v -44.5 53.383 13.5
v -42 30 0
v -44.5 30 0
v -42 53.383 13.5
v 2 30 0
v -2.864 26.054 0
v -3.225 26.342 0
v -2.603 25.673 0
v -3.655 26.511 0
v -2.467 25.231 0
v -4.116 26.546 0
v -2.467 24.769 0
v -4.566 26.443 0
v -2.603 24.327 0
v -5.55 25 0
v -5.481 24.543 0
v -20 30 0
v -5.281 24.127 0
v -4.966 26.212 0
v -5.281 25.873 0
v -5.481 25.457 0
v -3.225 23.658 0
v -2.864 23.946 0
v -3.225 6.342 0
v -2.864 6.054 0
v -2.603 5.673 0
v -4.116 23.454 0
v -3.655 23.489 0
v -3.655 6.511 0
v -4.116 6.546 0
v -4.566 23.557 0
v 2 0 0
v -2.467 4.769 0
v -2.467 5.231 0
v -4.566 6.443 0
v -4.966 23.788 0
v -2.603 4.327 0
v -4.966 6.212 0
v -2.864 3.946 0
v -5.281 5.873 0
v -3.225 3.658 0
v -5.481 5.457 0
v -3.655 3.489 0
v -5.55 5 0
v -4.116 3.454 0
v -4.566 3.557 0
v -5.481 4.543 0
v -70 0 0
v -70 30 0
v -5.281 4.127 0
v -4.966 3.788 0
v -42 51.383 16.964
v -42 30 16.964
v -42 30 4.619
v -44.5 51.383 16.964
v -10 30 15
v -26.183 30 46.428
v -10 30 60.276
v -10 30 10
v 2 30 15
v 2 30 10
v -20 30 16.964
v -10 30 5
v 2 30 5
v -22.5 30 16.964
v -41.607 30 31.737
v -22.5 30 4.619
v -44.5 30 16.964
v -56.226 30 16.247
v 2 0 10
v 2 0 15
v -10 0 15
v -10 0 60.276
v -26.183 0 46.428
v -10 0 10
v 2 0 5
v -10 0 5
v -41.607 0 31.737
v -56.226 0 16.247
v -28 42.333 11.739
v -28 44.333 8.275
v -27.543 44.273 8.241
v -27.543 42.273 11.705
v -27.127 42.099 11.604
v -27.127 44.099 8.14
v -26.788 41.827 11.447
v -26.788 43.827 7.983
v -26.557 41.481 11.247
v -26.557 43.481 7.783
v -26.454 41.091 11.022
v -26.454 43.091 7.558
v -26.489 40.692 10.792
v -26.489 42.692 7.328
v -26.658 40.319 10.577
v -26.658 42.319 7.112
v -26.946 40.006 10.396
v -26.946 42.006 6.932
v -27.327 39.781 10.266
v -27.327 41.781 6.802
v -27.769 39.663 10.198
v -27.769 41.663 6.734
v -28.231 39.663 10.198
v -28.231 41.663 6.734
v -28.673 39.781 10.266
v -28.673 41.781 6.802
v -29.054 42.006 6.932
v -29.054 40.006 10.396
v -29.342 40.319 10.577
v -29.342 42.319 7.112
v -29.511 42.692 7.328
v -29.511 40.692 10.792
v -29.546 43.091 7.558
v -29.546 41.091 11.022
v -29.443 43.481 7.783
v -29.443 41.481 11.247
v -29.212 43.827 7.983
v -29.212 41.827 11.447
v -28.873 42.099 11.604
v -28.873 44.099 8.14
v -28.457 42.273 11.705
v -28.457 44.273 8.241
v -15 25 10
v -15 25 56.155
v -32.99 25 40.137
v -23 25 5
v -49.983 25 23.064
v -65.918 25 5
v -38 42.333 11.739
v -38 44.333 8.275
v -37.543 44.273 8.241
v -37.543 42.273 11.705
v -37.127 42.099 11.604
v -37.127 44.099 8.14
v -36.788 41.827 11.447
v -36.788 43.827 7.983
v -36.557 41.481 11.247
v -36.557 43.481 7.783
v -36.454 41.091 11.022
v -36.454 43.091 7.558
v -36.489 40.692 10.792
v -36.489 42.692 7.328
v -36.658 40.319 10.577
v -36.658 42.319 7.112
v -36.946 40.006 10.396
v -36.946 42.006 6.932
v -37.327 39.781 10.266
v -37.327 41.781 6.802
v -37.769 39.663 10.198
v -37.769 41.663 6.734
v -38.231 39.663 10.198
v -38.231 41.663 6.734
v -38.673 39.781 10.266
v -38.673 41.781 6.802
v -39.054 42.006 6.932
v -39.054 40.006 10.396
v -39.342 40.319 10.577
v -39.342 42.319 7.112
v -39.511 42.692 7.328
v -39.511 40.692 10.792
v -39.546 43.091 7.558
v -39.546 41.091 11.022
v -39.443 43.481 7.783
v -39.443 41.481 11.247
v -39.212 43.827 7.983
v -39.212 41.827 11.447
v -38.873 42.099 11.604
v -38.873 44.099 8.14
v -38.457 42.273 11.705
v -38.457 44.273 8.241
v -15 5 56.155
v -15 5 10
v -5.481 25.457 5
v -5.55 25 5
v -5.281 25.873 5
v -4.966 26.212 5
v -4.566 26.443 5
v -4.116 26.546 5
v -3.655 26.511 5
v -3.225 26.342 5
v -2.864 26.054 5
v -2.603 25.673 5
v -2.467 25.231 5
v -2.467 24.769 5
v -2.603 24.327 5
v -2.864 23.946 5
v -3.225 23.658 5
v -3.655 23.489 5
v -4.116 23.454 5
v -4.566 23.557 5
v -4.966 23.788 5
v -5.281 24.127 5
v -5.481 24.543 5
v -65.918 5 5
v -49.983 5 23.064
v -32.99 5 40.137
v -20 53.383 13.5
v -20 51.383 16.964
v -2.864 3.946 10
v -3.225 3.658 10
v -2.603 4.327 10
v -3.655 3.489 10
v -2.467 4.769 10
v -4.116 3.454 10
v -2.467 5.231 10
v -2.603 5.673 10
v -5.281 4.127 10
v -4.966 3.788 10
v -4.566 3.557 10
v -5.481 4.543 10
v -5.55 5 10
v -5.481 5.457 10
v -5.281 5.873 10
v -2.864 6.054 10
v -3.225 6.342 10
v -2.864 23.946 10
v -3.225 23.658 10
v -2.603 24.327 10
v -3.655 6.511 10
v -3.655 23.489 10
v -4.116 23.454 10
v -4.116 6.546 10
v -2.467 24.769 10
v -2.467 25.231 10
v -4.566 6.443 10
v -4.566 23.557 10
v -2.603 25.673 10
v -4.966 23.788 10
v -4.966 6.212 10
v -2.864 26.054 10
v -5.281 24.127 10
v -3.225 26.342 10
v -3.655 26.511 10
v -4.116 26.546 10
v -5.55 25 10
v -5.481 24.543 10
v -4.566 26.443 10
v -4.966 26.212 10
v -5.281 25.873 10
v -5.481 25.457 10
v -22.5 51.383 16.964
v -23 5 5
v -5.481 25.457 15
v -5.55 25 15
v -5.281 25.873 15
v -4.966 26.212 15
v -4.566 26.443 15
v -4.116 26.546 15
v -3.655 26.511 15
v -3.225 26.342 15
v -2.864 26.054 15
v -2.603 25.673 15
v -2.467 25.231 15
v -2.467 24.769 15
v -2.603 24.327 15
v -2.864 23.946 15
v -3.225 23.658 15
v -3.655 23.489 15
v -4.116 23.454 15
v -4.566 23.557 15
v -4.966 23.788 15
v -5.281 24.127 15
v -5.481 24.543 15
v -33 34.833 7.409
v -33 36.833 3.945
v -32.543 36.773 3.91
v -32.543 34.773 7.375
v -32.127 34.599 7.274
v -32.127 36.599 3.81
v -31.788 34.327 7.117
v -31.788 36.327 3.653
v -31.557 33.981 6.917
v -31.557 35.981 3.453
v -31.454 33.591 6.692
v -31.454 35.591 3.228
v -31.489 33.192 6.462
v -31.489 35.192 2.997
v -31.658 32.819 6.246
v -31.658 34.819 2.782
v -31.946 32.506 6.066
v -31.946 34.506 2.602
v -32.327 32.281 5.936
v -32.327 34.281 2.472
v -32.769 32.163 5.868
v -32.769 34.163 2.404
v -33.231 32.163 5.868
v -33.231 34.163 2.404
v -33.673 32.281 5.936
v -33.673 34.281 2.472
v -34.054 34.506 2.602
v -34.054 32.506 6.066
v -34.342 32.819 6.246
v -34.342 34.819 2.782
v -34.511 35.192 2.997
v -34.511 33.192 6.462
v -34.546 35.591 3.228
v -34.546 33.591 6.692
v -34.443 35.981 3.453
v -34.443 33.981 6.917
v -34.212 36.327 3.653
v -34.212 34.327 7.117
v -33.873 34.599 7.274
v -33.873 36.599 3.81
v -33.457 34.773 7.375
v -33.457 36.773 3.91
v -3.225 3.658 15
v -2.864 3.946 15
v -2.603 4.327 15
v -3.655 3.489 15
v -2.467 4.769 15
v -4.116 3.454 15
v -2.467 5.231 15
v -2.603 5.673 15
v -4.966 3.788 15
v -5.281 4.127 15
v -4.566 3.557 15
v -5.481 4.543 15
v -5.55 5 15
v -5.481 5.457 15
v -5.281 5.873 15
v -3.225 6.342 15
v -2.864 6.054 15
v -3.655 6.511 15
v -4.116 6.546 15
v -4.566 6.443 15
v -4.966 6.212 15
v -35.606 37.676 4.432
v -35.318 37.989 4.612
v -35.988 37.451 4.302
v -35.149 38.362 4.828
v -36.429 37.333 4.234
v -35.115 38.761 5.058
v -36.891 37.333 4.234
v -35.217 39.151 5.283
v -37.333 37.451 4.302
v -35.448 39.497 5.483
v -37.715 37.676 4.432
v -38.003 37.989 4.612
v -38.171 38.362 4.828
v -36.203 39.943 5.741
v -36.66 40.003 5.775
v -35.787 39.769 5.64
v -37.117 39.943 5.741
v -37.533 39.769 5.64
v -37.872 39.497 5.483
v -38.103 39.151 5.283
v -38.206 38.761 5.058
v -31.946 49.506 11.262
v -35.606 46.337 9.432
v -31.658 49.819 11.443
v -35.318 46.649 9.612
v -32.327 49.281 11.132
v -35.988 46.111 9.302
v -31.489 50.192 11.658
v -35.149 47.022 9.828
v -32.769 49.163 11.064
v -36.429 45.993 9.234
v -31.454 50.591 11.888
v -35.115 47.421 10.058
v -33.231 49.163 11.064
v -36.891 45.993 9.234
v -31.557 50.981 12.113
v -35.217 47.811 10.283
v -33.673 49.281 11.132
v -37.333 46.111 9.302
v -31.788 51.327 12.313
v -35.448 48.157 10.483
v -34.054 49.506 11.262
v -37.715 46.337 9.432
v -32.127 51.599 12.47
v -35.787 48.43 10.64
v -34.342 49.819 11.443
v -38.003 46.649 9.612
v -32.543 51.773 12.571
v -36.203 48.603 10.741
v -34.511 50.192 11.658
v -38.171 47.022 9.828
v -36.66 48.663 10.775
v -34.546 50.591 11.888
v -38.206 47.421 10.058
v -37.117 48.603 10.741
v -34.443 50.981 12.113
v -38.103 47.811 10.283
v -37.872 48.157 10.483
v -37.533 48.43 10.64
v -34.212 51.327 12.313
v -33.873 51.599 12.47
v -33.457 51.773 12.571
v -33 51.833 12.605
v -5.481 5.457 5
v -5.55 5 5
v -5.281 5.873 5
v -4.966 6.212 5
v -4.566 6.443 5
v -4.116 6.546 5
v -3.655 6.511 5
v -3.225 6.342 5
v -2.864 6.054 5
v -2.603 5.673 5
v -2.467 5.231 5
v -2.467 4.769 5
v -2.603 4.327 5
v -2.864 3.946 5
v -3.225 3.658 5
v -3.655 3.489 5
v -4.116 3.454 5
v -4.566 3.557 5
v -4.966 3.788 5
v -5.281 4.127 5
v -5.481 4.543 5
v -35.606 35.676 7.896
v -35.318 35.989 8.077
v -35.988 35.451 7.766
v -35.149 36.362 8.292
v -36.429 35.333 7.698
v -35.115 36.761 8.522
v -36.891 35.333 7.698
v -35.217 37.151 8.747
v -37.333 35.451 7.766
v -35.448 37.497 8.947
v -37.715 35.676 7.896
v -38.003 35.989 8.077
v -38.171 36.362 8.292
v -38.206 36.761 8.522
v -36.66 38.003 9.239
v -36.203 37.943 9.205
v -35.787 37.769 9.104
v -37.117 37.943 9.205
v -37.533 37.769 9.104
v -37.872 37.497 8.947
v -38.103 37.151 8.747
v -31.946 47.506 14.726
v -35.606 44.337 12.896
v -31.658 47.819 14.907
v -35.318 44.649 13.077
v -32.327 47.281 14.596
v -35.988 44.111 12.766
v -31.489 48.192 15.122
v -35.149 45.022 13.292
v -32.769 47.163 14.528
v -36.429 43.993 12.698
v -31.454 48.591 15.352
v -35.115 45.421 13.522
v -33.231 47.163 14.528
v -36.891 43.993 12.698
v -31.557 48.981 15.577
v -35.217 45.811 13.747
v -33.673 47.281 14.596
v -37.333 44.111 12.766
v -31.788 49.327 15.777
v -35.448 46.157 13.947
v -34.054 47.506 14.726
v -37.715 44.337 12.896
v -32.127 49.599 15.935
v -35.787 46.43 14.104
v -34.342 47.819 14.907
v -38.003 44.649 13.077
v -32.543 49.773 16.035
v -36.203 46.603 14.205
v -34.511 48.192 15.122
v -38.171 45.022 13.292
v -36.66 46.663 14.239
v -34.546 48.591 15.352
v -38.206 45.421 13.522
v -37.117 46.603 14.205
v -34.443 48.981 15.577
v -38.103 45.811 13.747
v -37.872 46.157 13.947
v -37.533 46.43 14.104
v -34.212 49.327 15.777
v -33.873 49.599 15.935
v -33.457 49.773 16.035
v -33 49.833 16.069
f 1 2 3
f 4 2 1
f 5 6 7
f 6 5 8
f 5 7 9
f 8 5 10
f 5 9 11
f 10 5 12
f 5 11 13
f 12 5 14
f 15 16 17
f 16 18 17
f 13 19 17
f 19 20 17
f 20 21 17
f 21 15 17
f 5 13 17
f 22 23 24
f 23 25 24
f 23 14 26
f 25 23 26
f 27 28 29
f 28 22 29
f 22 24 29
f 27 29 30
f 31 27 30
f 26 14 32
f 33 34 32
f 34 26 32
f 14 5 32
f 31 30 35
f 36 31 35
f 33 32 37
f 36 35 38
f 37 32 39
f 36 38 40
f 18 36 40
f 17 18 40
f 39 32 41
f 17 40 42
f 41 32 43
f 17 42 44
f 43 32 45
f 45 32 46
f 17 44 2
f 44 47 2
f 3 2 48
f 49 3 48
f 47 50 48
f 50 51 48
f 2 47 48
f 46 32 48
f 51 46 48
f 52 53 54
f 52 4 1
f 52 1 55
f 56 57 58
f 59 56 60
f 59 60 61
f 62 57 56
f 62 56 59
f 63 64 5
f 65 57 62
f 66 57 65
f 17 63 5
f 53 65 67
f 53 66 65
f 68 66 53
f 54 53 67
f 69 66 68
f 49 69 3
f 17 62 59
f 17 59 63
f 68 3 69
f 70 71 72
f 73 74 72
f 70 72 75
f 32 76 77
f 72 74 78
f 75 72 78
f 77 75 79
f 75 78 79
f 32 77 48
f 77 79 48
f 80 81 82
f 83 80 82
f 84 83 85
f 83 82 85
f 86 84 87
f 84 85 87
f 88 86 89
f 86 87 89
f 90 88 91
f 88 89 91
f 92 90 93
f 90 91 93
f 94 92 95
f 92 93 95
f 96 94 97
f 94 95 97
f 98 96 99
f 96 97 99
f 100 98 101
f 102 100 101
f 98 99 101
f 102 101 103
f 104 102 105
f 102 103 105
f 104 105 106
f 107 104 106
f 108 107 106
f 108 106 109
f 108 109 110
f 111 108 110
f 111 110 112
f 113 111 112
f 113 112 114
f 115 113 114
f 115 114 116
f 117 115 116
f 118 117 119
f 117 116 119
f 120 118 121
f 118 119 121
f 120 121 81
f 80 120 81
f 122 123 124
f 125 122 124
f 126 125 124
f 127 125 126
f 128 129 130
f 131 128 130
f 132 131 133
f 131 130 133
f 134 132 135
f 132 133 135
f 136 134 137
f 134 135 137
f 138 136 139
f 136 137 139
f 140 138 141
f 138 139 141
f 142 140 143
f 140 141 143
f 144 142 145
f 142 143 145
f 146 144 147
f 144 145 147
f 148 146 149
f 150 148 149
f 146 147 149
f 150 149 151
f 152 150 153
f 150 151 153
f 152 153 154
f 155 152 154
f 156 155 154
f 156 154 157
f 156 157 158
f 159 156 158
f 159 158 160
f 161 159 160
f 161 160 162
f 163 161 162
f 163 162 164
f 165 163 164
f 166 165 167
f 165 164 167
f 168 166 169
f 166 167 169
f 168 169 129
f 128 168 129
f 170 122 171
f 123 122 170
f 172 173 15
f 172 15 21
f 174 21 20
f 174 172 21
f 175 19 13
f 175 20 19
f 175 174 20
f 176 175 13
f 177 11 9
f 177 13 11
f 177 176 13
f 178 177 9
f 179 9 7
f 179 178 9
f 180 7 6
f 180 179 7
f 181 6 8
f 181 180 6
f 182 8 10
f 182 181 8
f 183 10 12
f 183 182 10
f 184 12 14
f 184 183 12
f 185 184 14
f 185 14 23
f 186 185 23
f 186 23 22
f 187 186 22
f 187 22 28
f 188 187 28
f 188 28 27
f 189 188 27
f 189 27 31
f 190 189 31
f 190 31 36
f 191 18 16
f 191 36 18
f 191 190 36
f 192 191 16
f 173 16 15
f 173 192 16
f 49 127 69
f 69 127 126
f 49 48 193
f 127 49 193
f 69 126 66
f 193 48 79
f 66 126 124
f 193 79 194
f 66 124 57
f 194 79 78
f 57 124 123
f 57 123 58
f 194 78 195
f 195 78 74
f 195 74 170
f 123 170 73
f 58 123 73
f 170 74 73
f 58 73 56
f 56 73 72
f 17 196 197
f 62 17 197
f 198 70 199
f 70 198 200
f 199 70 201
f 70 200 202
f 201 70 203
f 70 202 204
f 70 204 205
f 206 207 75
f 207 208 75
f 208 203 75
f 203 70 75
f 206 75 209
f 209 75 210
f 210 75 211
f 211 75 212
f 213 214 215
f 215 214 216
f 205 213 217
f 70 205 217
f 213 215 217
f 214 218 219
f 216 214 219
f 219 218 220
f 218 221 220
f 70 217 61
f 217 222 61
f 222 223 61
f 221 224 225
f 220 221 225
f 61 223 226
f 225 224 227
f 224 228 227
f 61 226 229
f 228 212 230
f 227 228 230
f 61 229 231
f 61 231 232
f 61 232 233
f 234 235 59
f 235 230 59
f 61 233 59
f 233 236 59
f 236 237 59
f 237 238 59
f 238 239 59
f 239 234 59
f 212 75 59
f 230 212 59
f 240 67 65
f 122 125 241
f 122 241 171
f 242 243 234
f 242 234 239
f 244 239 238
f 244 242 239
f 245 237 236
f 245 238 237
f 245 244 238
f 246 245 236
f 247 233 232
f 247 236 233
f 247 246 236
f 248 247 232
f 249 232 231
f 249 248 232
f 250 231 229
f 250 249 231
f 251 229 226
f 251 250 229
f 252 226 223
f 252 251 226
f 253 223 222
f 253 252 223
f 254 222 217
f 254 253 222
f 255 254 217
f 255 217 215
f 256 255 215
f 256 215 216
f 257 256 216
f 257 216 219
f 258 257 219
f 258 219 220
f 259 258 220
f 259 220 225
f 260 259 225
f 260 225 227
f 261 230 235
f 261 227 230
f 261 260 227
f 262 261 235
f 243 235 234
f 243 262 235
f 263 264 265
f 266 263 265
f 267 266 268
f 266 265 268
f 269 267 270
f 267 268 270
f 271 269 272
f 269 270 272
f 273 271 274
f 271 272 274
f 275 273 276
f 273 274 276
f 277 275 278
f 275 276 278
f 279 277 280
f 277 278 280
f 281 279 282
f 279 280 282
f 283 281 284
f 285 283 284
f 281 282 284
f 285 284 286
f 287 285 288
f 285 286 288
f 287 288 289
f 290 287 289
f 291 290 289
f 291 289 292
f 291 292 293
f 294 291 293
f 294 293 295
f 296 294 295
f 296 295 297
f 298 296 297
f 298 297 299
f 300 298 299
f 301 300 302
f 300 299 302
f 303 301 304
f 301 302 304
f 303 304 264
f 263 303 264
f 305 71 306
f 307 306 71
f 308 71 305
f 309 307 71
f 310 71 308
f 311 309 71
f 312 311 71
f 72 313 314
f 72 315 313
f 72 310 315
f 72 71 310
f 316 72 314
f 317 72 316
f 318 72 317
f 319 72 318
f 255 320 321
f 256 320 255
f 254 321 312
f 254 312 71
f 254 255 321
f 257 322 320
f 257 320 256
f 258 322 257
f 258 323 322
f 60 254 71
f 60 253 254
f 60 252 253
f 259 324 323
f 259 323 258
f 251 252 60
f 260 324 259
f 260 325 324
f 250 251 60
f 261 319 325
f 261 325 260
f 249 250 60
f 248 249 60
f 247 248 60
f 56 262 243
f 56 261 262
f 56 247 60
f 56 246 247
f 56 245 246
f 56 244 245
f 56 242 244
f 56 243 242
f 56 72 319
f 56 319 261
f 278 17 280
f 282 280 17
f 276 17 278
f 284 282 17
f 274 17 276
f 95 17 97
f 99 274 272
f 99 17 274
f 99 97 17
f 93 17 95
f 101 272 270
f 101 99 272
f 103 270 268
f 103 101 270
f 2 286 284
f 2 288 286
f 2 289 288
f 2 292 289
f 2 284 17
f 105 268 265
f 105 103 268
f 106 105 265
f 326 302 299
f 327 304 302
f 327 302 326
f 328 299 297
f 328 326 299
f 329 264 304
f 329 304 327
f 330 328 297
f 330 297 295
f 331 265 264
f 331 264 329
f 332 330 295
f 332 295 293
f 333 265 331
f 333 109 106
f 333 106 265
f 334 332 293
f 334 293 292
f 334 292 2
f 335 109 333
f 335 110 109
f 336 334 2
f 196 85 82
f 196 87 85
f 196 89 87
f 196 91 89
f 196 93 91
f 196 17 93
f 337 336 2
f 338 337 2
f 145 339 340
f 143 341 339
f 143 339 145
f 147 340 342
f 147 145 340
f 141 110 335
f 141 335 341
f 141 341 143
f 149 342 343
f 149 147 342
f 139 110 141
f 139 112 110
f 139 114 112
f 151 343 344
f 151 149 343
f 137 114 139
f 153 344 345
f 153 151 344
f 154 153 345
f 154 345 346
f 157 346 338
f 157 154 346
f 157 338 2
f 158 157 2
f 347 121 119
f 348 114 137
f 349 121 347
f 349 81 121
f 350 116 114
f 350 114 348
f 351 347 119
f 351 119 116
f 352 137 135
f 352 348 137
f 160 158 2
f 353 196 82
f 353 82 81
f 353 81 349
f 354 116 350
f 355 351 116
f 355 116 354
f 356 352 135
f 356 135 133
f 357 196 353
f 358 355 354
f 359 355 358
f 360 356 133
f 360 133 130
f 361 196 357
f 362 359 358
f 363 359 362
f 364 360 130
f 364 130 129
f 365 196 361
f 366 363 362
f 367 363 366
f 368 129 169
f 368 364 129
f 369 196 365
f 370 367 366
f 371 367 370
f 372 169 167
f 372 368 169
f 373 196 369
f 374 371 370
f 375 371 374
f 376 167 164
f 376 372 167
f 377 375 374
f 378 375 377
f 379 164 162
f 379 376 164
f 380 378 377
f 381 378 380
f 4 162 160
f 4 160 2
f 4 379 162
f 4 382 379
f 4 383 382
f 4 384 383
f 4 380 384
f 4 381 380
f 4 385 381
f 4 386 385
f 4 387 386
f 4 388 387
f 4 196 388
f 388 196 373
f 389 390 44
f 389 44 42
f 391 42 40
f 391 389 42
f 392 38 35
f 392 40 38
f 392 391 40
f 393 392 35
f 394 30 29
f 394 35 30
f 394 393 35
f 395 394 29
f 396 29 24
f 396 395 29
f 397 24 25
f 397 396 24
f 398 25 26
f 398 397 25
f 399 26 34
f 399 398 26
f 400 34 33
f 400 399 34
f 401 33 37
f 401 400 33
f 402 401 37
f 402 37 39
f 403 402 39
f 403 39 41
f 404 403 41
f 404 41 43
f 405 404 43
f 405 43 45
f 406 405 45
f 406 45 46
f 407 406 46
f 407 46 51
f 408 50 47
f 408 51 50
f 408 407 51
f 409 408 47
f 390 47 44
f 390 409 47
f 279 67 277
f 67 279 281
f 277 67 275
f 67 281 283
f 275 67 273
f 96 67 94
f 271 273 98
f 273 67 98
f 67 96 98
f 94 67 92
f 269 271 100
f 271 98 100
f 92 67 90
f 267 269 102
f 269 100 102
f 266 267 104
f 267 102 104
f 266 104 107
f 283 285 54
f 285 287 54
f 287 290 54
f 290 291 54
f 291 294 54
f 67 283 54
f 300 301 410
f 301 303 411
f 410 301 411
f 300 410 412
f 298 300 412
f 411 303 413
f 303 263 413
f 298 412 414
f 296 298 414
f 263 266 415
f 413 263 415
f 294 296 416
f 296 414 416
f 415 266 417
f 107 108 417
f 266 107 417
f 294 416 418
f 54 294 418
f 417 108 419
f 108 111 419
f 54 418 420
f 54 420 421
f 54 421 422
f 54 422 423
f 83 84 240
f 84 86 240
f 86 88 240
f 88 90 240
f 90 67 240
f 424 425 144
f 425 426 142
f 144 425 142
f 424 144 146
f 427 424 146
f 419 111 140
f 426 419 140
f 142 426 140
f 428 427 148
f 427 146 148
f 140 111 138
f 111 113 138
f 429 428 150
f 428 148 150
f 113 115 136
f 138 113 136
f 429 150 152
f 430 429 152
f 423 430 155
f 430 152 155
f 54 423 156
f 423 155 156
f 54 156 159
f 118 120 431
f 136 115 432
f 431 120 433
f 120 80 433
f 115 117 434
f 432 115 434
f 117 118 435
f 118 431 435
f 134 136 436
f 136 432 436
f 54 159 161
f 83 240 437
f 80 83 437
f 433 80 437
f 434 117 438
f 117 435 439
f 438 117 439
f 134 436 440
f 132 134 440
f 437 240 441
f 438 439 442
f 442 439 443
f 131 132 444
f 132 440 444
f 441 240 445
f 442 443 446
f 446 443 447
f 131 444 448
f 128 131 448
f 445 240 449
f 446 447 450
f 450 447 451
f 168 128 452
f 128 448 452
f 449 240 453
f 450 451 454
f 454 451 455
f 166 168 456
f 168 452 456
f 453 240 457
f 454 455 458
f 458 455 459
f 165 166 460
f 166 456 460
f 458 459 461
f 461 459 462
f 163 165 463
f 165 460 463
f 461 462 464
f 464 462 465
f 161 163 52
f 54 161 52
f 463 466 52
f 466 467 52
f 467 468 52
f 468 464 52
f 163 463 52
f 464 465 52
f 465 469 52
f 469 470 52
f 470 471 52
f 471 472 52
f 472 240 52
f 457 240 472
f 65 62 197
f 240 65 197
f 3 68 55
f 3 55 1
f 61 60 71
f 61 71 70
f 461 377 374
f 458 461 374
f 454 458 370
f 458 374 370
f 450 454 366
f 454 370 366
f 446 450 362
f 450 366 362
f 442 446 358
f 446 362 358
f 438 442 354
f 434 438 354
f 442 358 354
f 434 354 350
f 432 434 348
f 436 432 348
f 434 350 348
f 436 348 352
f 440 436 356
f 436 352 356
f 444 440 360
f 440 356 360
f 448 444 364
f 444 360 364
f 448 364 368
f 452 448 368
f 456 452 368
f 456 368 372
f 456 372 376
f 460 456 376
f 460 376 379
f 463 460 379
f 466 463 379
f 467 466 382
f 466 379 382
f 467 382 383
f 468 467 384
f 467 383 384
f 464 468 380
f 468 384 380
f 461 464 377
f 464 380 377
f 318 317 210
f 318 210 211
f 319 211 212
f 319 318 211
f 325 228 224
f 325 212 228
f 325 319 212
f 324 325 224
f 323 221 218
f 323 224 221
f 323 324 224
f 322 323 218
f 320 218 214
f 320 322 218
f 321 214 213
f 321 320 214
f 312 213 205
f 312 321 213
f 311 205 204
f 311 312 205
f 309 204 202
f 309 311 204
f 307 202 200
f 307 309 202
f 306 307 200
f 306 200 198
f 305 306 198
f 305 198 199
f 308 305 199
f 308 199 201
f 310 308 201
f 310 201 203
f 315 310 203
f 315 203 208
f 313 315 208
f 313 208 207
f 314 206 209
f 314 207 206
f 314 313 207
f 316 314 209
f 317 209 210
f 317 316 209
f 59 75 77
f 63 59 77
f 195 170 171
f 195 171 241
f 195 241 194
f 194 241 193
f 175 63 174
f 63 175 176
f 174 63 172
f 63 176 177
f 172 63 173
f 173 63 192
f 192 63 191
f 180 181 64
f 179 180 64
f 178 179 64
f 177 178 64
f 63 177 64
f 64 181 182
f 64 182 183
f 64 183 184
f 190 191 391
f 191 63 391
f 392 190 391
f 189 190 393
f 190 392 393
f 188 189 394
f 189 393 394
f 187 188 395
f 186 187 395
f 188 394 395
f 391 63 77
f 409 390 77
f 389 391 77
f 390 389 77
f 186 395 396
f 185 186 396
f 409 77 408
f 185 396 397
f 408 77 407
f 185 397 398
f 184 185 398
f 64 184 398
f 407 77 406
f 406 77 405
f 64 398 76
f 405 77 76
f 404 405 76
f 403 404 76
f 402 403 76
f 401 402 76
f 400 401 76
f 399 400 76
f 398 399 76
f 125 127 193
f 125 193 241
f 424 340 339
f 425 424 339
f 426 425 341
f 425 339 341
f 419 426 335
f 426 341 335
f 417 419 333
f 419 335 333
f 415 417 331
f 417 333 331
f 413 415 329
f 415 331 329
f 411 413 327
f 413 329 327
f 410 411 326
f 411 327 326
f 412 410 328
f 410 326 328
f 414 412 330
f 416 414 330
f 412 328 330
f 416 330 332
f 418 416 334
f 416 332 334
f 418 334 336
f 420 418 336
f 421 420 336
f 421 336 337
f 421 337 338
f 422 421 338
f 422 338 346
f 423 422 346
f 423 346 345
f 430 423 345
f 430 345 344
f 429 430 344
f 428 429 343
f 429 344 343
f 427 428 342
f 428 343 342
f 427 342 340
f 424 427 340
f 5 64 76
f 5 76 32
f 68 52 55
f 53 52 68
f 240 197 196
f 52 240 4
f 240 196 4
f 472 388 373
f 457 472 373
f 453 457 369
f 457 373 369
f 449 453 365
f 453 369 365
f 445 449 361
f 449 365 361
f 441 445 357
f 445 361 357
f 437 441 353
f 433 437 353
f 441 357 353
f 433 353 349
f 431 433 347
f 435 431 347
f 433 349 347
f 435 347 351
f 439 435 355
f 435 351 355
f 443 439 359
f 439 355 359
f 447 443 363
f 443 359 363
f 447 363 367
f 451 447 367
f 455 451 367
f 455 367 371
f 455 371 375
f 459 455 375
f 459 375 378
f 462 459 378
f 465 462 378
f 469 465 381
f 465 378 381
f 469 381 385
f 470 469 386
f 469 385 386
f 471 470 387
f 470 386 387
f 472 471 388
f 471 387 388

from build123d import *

# Parameters (mm, degrees)
EXTRUDE_1_DEPTH          = 30
CUT_EXTRUDE_1_DEPTH      = 98.124713642
CUT_EXTRUDE_1_DEPTH_BACK = 98.124713642
SKETCH_2_R               = 1.55
CUT_EXTRUDE_6_DEPTH      = 10
EXTRUDE_3_DEPTH          = 12.5
SKETCH_12_W              = 5
SKETCH_12_H              = 30
EXTRUDE_4_DEPTH          = 2
SKETCH_14_W              = 22
SKETCH_14_H              = 27
SKETCH_14_R              = 1.55
EXTRUDE_5_DEPTH          = 4
EXTRUDE_8_DEPTH          = 2.5
EXTRUDE_9_DEPTH          = 2.5


with BuildPart() as part:
    # 草图1 → 凸台-拉伸1 (new body)
    with BuildSketch(Plane(origin=(0, 0, 0), x_dir=(1, 0, 0), z_dir=(0, 1, 0))):
        with BuildLine():
            Line((0, 0), (-70, 0))
            ThreePointArc((-70, 0), (-41.606545869, -31.737243891), (-10, -60.276114672))
            Line((-10, -60.276114672), (-10, -15))
            Line((-10, -15), (0, -15))
            Line((0, -15), (0, -10))
            Line((0, -10), (-10, -10))
            Line((-10, -10), (-10, -5))
            Line((-10, -5), (0, -5))
            Line((0, -5), (0, 0))
        make_face()
    extrude(amount=EXTRUDE_1_DEPTH)

    # 草图2 → 切除-拉伸1 (cut, two sides: drawn at the far end of the back side and taken through both)
    with BuildSketch(Plane(origin=(0, 0, 0), x_dir=(-1, 0, 0), z_dir=(0, 0, -1)).offset(-CUT_EXTRUDE_1_DEPTH_BACK)):
        with Locations((4, 25)):
            Circle(SKETCH_2_R)
        with Locations((4, 5)):
            Circle(SKETCH_2_R)
    extrude(amount=CUT_EXTRUDE_1_DEPTH + CUT_EXTRUDE_1_DEPTH_BACK, mode=Mode.SUBTRACT)

    # 草图9 → 切除-拉伸6 (cut, symmetric)
    with BuildSketch(Plane(origin=(0, 15, 0), x_dir=(1, 0, 0), z_dir=(0, 1, 0))):
        with BuildLine():
            Line((-65.918016471, -5), (-59.391772218, -5))
            Line((-59.391772218, -5), (-15, -5))
            Line((-15, -5), (-15, -15))
            Line((-15, -15), (-15, -49.60330608))
            Line((-15, -49.60330608), (-15, -56.155472209))
            ThreePointArc((-15, -56.155472209), (-41.615194331, -31.728555364), (-65.918016471, -5))
        make_face()
    extrude(amount=CUT_EXTRUDE_6_DEPTH, both=True, mode=Mode.SUBTRACT)

    # 草图11 → 凸台-拉伸3 (add, symmetric)
    with BuildSketch(Plane(origin=(0, 15, 0), x_dir=(1, 0, 0), z_dir=(0, 1, 0))):
        Polygon((-15, -5), (-23, -5), (-15, -10), align=None)
    extrude(amount=EXTRUDE_3_DEPTH, both=True)

    # 草图12 → 凸台-拉伸4 (add)
    with BuildSketch(Plane(origin=(0, 0, 0), x_dir=(0, 0, -1), z_dir=(1, 0, 0))):
        with Locations((-12.5, 15)):
            Rectangle(SKETCH_12_W, SKETCH_12_H)
        with Locations((-2.5, 15)):
            Rectangle(SKETCH_12_W, SKETCH_12_H)
    extrude(amount=EXTRUDE_4_DEPTH)

    # 草图14 → 凸台-拉伸5 (add)
    with BuildSketch(Plane(origin=(0, 7.5, -12.990381057), x_dir=(-1, 0, 0), z_dir=(0, 0.499999999999998, -0.8660254037844398))):
        with Locations((31, 39.480762114)):
            Rectangle(SKETCH_14_W, SKETCH_14_H)
        with Locations(Location((28, 40.980762114, 0), (0, 0, 90))):
            Circle(SKETCH_14_R, mode=Mode.SUBTRACT)
        with Locations(Location((33, 49.641016151, 0), (0, 0, 90))):
            Circle(SKETCH_14_R, mode=Mode.SUBTRACT)
        with Locations(Location((36.660254038, 45.980762114, 0), (0, 0, 90))):
            Circle(SKETCH_14_R, mode=Mode.SUBTRACT)
        with Locations(Location((38, 40.980762114, 0), (0, 0, 90))):
            Circle(SKETCH_14_R, mode=Mode.SUBTRACT)
        with Locations(Location((36.660254038, 35.980762114, 0), (0, 0, 90))):
            Circle(SKETCH_14_R, mode=Mode.SUBTRACT)
        with Locations(Location((33, 32.320508076, 0), (0, 0, 90))):
            Circle(SKETCH_14_R, mode=Mode.SUBTRACT)
    extrude(amount=-EXTRUDE_5_DEPTH)

    # 草图18 → 凸台-拉伸8 (add)
    with BuildSketch(Plane(origin=(-20, 0, 0), x_dir=(0, 0, -1), z_dir=(1, 0, 0))):
        Polygon((-16.964101615, 51.382685902), (-4.618802154, 30), (-16.964101615, 30), align=None)
    extrude(amount=-EXTRUDE_8_DEPTH)

    # 草图19 → 凸台-拉伸9 (add)
    with BuildSketch(Plane.ZY.offset(42)):
        Polygon((0, 30), (13.5, 53.382685902), (16.964101615, 51.382685902), (16.964101615, 30), align=None)
    extrude(amount=EXTRUDE_9_DEPTH)


solid = part.part
